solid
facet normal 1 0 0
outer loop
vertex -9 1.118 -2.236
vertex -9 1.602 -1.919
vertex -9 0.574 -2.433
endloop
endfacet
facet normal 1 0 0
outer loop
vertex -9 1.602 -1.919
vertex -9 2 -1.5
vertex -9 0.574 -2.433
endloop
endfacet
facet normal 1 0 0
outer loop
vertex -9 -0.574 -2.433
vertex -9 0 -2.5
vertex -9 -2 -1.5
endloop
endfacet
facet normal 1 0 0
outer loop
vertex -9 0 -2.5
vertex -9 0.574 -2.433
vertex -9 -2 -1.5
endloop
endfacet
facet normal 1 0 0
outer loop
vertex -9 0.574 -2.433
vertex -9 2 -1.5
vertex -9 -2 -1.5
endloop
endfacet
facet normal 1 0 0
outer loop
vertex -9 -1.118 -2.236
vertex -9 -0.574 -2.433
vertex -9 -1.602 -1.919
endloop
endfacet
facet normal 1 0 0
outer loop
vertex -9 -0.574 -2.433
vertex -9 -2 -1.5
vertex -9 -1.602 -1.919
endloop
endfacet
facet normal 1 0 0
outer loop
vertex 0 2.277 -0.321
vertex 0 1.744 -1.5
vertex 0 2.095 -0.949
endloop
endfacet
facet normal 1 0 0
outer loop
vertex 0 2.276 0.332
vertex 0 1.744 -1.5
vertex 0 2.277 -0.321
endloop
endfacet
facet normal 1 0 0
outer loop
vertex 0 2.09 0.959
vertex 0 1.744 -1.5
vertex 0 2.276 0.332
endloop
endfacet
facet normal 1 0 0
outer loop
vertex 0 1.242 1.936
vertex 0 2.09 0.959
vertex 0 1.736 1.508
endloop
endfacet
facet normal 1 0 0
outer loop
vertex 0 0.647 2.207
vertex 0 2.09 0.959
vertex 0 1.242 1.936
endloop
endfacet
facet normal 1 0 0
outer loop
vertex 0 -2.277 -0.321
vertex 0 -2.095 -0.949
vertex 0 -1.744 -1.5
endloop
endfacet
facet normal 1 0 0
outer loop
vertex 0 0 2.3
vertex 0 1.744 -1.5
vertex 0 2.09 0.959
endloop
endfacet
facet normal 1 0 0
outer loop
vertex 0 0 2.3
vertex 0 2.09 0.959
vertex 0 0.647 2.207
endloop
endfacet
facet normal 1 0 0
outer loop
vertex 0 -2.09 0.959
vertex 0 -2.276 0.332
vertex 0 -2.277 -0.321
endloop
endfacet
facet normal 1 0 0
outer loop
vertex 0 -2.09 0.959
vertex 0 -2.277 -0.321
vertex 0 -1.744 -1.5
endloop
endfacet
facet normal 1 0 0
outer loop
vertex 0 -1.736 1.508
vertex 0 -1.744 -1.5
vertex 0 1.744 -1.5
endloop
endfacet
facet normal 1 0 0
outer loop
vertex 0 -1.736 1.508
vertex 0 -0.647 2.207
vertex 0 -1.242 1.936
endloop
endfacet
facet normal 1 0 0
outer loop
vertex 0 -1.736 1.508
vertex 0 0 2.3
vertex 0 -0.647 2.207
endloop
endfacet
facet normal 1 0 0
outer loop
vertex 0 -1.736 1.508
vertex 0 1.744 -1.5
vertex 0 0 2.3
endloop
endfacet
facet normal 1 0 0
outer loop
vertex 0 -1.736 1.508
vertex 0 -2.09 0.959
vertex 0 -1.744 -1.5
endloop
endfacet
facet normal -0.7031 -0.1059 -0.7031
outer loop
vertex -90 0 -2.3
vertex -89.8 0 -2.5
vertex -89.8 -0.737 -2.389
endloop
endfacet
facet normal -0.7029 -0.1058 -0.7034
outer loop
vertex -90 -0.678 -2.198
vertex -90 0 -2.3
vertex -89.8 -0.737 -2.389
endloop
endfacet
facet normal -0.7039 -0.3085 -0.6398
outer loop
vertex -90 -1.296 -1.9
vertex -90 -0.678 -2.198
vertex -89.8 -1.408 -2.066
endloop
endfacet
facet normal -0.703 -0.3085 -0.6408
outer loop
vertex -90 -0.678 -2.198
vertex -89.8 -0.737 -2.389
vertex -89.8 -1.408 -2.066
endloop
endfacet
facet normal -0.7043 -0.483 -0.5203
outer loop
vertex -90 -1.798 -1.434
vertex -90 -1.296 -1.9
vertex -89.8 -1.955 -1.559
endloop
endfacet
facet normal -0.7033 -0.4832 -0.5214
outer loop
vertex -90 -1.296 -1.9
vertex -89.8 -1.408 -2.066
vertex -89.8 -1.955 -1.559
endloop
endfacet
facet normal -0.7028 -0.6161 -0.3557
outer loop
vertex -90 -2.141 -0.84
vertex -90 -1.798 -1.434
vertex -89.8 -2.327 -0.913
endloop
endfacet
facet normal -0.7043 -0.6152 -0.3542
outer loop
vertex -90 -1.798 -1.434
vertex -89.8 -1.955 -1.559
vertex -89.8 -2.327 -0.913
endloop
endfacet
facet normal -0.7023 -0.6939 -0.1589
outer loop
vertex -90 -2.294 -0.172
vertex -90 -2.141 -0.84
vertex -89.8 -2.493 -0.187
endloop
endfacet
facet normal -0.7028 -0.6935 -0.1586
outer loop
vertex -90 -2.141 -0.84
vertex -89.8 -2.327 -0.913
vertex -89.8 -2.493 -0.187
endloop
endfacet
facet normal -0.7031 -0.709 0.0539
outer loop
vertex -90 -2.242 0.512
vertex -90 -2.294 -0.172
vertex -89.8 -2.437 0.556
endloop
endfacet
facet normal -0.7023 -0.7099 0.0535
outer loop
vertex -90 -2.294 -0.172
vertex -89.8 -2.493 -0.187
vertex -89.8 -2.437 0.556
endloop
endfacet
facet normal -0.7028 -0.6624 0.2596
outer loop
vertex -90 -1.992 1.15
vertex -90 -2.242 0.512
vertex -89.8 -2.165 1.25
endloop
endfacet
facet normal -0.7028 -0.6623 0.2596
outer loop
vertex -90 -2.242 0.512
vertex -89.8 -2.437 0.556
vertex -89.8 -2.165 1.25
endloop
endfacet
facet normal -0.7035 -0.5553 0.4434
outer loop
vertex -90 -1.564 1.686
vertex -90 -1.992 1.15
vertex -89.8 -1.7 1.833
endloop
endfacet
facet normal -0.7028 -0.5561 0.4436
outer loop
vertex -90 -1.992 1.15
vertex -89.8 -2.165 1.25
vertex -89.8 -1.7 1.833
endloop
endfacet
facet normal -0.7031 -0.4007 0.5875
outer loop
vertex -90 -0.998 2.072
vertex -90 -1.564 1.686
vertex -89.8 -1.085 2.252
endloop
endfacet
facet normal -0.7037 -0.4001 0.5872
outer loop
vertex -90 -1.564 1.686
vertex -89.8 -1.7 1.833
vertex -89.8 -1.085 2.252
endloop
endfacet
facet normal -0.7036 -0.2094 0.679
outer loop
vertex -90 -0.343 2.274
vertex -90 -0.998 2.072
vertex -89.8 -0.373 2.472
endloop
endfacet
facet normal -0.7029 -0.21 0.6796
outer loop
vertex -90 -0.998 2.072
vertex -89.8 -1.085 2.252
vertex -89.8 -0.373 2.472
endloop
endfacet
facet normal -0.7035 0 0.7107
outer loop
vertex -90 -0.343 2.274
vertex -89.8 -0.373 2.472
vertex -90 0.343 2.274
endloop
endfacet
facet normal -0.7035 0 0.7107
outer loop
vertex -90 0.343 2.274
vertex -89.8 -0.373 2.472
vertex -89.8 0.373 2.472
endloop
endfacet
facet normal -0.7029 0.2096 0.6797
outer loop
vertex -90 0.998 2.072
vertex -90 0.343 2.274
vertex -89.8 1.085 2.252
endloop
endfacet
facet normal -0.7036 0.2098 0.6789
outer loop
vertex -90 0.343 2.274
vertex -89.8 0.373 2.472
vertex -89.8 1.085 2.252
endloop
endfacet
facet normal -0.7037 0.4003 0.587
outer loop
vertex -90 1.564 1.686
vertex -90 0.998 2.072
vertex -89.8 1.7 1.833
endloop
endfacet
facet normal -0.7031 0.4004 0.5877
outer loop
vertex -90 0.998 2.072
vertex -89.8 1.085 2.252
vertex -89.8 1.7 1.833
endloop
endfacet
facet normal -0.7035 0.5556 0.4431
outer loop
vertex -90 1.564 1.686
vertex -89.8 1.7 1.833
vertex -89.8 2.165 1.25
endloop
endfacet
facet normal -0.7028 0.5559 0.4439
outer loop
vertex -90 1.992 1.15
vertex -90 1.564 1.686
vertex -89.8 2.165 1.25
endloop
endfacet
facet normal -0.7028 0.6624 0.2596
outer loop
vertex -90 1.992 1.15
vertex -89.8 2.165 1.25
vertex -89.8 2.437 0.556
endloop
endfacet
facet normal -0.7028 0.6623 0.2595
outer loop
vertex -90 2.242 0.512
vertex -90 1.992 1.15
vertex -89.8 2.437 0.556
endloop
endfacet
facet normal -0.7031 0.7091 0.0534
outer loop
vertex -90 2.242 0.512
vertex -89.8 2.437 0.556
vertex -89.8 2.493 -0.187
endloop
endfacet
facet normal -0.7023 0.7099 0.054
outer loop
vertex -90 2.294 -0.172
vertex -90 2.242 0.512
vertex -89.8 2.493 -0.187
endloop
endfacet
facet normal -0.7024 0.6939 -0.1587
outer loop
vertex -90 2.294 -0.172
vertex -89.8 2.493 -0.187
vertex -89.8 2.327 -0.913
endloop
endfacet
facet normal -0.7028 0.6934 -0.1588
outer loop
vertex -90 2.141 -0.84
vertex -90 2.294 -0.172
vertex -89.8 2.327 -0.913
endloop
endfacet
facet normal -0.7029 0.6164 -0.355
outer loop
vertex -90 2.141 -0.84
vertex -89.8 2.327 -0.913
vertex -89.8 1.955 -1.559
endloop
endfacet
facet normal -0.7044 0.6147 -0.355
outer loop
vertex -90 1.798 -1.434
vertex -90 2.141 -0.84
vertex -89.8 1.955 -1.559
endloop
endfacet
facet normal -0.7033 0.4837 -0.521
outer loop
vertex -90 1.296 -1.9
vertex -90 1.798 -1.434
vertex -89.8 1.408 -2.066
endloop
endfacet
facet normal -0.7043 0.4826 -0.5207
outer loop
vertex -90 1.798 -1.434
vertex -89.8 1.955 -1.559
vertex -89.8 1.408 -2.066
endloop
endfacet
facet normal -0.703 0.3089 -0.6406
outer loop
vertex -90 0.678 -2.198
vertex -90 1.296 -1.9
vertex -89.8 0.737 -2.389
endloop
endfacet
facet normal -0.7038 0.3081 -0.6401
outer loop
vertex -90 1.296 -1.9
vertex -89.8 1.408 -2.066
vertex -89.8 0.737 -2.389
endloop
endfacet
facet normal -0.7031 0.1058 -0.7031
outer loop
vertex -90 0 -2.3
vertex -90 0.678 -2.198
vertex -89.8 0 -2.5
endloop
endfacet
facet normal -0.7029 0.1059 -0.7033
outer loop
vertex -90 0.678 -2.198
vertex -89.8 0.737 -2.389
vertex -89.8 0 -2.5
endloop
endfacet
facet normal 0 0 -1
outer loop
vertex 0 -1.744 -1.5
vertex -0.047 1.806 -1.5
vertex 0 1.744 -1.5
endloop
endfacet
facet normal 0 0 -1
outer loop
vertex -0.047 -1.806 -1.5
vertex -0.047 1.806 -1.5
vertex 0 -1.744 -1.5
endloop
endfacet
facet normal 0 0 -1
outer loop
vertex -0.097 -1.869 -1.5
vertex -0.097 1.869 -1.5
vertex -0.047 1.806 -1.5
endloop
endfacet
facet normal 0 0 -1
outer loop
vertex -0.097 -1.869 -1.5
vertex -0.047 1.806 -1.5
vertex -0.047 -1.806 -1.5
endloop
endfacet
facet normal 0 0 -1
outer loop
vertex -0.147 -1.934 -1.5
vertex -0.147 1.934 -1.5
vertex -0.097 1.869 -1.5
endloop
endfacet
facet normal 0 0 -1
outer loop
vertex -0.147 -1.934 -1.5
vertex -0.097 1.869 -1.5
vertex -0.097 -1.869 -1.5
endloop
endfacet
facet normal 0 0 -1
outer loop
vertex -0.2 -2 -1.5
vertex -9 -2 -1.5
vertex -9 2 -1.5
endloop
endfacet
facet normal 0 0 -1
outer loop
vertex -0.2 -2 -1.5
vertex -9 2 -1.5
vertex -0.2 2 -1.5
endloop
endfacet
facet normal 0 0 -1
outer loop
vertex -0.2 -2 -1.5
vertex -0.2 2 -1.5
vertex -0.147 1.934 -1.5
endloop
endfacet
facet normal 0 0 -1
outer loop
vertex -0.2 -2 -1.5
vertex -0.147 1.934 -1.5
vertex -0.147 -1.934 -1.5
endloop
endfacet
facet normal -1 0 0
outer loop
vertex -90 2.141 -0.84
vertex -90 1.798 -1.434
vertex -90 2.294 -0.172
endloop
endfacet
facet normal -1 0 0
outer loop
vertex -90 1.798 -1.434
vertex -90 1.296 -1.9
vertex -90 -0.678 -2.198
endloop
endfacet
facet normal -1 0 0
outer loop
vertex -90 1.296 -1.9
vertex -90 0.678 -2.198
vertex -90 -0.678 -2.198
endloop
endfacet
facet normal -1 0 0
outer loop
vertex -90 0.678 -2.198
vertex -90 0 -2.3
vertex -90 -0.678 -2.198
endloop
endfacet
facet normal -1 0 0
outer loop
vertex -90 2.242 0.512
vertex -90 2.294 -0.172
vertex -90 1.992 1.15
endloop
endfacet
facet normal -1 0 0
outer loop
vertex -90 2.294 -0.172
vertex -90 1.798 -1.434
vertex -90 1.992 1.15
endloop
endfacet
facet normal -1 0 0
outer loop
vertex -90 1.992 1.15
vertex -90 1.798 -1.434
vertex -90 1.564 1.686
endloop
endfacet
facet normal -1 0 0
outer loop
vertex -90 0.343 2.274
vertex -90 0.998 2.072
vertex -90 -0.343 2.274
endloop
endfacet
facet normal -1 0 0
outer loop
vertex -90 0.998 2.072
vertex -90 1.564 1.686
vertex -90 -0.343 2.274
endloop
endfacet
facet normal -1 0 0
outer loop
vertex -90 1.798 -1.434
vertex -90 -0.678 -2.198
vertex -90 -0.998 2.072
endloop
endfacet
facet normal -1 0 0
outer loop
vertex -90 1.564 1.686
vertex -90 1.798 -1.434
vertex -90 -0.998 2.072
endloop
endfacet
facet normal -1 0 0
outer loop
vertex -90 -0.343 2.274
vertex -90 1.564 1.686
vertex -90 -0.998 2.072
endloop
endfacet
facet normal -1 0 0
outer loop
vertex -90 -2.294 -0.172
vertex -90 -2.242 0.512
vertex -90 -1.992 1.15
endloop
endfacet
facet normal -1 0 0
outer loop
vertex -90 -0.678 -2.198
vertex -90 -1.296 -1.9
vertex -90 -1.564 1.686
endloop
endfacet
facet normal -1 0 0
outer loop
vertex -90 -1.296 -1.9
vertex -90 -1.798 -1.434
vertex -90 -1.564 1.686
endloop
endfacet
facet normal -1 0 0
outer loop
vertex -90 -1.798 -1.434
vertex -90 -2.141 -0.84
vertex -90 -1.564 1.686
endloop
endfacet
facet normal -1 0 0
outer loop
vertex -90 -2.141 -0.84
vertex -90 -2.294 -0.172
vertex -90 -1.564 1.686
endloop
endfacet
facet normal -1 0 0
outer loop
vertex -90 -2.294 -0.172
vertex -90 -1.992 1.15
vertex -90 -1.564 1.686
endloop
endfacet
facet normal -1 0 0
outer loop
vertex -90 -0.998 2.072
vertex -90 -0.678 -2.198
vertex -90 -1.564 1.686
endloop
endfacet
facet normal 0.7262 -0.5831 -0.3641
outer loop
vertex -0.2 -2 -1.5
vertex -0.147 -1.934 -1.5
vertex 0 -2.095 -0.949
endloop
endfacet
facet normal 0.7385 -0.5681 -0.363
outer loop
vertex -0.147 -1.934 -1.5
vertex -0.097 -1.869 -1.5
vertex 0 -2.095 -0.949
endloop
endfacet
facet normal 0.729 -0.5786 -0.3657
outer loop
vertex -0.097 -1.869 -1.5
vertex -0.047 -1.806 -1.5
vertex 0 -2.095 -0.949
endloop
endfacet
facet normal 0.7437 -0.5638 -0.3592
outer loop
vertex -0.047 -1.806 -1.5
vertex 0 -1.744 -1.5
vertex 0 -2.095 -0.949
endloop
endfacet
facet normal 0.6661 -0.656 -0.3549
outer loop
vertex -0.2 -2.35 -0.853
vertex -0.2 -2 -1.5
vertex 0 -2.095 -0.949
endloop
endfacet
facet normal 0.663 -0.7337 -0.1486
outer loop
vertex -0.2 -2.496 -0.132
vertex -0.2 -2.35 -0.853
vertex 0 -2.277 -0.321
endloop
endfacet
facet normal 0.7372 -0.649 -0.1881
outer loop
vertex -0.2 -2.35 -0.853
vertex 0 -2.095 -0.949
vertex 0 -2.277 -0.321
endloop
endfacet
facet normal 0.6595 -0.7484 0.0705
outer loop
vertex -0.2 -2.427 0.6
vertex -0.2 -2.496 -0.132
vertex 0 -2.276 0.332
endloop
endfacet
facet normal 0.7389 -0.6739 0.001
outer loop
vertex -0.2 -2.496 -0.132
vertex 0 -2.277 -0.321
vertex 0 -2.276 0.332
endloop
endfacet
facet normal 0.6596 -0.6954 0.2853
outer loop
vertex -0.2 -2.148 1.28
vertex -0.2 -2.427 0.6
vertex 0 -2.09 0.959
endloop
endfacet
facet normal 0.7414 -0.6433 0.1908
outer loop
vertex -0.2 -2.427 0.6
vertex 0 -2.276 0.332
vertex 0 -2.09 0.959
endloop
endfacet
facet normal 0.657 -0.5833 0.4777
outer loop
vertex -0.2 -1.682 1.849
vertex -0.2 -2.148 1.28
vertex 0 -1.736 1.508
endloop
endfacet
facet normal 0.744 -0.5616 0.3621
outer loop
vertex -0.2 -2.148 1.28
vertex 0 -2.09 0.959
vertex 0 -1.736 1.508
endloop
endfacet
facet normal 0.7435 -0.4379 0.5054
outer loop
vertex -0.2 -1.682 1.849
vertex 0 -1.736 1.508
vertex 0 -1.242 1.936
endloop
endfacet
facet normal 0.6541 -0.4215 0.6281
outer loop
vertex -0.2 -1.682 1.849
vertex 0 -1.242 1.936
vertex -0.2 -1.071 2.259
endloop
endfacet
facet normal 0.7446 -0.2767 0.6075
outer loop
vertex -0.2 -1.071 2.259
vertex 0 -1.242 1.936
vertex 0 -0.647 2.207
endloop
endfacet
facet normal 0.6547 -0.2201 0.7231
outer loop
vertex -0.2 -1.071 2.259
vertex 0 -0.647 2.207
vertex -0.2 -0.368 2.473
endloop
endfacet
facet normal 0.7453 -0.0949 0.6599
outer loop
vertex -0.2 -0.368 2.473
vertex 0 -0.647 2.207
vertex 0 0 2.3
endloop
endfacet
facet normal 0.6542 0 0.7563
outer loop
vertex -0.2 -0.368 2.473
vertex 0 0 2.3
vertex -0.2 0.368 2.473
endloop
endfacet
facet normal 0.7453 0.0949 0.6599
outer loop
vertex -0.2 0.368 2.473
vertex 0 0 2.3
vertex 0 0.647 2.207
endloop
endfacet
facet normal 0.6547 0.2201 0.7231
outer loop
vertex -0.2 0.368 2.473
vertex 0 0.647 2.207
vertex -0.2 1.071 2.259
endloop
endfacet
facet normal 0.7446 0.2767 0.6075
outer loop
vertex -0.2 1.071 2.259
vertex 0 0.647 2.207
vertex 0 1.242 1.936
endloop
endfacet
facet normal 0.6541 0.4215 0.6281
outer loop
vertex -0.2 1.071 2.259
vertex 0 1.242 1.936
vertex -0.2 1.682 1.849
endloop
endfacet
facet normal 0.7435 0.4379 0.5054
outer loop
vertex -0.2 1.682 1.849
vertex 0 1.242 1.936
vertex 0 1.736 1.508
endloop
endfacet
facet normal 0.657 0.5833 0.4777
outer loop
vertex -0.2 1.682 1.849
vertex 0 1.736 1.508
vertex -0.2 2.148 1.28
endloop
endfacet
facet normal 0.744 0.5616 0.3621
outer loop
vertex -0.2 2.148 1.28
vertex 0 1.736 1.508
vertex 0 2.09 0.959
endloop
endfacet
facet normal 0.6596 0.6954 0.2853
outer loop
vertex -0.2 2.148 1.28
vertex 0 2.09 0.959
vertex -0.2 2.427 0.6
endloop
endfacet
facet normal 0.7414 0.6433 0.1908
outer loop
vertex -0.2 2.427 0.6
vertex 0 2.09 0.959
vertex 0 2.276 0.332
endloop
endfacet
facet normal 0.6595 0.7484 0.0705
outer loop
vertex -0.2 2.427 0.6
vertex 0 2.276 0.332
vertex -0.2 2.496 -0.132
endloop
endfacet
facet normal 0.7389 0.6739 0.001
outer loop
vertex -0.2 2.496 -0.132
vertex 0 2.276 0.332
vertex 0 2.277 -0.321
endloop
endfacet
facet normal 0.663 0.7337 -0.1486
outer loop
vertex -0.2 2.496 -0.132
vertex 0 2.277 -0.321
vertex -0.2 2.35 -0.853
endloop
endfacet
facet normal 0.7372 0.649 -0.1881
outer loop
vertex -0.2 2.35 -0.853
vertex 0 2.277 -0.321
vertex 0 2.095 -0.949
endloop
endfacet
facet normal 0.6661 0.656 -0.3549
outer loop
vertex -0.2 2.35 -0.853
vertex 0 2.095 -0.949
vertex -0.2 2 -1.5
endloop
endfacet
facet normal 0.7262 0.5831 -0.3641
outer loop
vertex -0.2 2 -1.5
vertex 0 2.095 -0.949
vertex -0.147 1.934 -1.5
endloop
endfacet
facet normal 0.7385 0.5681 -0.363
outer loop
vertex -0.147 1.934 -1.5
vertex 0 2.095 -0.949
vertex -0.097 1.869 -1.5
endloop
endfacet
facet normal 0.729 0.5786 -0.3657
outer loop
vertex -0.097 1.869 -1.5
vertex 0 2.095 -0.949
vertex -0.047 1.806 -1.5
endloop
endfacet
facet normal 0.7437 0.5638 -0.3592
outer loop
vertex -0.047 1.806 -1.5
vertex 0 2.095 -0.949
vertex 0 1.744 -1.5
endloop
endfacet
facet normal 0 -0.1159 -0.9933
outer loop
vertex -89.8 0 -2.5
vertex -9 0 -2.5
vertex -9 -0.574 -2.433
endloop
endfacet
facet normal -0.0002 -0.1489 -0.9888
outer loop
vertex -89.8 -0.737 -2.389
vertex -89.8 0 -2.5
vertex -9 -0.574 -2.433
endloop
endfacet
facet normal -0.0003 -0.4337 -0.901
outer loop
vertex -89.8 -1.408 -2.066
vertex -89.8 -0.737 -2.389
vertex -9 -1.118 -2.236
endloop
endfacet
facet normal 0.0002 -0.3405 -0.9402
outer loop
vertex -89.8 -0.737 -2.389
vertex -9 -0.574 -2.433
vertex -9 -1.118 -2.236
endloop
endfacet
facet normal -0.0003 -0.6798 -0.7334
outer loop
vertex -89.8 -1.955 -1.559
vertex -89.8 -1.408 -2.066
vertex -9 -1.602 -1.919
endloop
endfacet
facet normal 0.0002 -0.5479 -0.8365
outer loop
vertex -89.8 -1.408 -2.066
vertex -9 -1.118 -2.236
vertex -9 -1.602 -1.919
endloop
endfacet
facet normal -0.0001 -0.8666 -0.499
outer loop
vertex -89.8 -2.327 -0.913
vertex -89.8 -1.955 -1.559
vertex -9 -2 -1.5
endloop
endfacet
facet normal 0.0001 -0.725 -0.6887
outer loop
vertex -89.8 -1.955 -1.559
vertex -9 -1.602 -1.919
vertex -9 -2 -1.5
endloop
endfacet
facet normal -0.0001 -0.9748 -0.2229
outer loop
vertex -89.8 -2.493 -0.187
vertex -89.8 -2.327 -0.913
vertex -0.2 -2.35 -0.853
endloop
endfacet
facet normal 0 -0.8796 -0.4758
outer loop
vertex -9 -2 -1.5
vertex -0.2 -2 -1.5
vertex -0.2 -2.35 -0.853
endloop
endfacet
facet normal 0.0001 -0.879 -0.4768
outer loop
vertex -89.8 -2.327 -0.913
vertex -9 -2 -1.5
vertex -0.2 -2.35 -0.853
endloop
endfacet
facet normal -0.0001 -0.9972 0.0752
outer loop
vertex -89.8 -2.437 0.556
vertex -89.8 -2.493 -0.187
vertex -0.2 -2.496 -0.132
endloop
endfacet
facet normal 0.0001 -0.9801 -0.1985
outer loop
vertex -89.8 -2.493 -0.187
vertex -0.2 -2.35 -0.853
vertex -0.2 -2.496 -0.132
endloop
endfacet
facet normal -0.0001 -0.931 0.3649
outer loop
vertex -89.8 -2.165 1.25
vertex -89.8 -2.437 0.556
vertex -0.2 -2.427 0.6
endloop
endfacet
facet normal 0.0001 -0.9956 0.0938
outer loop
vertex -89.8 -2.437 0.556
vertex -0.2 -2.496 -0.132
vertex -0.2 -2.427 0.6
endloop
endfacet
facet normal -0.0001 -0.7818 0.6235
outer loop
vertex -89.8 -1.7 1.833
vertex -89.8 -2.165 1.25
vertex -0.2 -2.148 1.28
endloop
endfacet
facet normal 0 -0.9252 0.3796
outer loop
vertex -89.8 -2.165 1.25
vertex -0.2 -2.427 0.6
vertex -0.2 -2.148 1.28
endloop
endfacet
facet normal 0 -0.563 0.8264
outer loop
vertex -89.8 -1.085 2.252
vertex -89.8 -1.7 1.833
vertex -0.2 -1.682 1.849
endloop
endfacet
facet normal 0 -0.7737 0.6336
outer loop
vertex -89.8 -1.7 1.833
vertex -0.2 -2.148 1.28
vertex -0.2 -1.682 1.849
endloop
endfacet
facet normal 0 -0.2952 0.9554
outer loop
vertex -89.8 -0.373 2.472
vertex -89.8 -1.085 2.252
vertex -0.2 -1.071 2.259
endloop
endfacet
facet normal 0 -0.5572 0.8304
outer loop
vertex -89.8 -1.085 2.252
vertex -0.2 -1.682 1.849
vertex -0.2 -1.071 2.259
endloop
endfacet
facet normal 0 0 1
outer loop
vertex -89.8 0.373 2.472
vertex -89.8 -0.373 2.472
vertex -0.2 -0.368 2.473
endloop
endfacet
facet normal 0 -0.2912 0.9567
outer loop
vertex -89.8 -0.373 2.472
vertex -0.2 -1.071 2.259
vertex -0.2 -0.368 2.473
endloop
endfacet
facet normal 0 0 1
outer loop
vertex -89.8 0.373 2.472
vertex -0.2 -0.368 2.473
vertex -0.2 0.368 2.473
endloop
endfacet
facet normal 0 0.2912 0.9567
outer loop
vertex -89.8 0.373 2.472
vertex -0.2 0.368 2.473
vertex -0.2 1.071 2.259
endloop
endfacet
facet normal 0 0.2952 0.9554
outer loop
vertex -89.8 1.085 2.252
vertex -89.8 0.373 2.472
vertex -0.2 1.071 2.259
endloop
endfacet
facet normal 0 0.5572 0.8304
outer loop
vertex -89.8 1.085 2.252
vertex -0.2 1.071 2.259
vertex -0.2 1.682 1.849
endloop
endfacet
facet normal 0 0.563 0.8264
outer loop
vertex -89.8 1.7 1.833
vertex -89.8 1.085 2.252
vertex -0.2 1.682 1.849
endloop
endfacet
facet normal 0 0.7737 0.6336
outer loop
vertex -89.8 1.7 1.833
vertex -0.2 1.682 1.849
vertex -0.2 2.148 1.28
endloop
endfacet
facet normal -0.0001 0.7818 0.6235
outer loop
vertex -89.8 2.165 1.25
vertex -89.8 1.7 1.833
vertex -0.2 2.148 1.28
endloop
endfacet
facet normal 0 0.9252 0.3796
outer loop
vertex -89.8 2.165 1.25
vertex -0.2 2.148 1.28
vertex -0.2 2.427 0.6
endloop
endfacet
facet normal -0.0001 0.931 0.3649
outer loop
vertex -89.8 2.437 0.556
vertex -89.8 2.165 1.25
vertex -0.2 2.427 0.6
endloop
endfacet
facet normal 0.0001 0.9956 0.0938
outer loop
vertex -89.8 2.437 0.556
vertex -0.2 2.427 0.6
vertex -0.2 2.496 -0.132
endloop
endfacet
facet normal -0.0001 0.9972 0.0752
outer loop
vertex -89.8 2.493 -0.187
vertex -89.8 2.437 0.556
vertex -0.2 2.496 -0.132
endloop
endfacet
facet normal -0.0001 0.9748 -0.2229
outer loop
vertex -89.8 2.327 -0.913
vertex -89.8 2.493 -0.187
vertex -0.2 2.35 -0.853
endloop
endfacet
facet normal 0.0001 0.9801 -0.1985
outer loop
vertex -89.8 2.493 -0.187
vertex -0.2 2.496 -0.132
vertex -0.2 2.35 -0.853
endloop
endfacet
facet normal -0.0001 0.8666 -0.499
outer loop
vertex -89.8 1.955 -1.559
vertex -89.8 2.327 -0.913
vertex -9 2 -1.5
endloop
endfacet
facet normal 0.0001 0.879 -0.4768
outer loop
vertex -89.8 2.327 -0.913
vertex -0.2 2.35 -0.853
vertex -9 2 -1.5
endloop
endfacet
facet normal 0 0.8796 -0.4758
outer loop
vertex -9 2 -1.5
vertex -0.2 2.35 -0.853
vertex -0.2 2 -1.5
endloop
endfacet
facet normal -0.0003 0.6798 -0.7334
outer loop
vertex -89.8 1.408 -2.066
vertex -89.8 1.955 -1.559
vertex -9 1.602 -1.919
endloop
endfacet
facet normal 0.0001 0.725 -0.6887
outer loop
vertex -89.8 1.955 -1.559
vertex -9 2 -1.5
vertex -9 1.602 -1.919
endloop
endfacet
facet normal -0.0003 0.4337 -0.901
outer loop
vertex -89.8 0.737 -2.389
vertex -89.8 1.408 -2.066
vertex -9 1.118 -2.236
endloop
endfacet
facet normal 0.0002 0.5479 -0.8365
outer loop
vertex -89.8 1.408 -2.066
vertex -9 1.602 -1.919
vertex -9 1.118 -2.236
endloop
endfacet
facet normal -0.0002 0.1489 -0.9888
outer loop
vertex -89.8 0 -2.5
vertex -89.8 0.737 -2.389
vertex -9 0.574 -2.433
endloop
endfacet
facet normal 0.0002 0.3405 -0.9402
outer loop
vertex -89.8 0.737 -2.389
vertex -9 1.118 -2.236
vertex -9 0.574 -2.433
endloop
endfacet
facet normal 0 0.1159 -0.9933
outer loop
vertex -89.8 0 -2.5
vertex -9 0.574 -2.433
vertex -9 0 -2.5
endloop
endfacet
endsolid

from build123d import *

# Parameters (mm, degrees)
SKETCH1_W               = 90
SKETCH1_H               = 2.5
CUT_EXTRUDE1_DEPTH      = 91.069417673
CUT_EXTRUDE1_DEPTH_BACK = 91.069417673
SKETCH2_W               = 9
SKETCH2_H               = 1
CHAMFER1_SIZE           = 0.2


with BuildPart() as part:
    # Sketch1 → Revolve1 (revolve)
    with BuildSketch(Plane(origin=(0, 0, 0), x_dir=(1, 0, 0), z_dir=(0, 1, 0))):
        with Locations((-45, 1.25)):
            Rectangle(SKETCH1_W, SKETCH1_H)
    revolve(axis=Axis((0, 0, 0), (-1, 0, 0)))

    # Sketch2 → Cut-Extrude1 (cut, two sides: drawn at the far end of the back side and taken through both)
    with BuildSketch(Plane(origin=(0, 0, 0), x_dir=(1, 0, 0), z_dir=(0, 1, 0)).offset(-CUT_EXTRUDE1_DEPTH_BACK)):
        with Locations((-4.5, 2)):
            Rectangle(SKETCH2_W, SKETCH2_H)
    extrude(amount=CUT_EXTRUDE1_DEPTH + CUT_EXTRUDE1_DEPTH_BACK, mode=Mode.SUBTRACT)

    # Chamfer1
    chamfer1_edges = [part.edges().sort_by_distance(p)[0] for p in [
        (-90, 0, 2.5),
        (0, 0, 2.5),
    ]]
    chamfer(chamfer1_edges, length=CHAMFER1_SIZE)


solid = part.part
